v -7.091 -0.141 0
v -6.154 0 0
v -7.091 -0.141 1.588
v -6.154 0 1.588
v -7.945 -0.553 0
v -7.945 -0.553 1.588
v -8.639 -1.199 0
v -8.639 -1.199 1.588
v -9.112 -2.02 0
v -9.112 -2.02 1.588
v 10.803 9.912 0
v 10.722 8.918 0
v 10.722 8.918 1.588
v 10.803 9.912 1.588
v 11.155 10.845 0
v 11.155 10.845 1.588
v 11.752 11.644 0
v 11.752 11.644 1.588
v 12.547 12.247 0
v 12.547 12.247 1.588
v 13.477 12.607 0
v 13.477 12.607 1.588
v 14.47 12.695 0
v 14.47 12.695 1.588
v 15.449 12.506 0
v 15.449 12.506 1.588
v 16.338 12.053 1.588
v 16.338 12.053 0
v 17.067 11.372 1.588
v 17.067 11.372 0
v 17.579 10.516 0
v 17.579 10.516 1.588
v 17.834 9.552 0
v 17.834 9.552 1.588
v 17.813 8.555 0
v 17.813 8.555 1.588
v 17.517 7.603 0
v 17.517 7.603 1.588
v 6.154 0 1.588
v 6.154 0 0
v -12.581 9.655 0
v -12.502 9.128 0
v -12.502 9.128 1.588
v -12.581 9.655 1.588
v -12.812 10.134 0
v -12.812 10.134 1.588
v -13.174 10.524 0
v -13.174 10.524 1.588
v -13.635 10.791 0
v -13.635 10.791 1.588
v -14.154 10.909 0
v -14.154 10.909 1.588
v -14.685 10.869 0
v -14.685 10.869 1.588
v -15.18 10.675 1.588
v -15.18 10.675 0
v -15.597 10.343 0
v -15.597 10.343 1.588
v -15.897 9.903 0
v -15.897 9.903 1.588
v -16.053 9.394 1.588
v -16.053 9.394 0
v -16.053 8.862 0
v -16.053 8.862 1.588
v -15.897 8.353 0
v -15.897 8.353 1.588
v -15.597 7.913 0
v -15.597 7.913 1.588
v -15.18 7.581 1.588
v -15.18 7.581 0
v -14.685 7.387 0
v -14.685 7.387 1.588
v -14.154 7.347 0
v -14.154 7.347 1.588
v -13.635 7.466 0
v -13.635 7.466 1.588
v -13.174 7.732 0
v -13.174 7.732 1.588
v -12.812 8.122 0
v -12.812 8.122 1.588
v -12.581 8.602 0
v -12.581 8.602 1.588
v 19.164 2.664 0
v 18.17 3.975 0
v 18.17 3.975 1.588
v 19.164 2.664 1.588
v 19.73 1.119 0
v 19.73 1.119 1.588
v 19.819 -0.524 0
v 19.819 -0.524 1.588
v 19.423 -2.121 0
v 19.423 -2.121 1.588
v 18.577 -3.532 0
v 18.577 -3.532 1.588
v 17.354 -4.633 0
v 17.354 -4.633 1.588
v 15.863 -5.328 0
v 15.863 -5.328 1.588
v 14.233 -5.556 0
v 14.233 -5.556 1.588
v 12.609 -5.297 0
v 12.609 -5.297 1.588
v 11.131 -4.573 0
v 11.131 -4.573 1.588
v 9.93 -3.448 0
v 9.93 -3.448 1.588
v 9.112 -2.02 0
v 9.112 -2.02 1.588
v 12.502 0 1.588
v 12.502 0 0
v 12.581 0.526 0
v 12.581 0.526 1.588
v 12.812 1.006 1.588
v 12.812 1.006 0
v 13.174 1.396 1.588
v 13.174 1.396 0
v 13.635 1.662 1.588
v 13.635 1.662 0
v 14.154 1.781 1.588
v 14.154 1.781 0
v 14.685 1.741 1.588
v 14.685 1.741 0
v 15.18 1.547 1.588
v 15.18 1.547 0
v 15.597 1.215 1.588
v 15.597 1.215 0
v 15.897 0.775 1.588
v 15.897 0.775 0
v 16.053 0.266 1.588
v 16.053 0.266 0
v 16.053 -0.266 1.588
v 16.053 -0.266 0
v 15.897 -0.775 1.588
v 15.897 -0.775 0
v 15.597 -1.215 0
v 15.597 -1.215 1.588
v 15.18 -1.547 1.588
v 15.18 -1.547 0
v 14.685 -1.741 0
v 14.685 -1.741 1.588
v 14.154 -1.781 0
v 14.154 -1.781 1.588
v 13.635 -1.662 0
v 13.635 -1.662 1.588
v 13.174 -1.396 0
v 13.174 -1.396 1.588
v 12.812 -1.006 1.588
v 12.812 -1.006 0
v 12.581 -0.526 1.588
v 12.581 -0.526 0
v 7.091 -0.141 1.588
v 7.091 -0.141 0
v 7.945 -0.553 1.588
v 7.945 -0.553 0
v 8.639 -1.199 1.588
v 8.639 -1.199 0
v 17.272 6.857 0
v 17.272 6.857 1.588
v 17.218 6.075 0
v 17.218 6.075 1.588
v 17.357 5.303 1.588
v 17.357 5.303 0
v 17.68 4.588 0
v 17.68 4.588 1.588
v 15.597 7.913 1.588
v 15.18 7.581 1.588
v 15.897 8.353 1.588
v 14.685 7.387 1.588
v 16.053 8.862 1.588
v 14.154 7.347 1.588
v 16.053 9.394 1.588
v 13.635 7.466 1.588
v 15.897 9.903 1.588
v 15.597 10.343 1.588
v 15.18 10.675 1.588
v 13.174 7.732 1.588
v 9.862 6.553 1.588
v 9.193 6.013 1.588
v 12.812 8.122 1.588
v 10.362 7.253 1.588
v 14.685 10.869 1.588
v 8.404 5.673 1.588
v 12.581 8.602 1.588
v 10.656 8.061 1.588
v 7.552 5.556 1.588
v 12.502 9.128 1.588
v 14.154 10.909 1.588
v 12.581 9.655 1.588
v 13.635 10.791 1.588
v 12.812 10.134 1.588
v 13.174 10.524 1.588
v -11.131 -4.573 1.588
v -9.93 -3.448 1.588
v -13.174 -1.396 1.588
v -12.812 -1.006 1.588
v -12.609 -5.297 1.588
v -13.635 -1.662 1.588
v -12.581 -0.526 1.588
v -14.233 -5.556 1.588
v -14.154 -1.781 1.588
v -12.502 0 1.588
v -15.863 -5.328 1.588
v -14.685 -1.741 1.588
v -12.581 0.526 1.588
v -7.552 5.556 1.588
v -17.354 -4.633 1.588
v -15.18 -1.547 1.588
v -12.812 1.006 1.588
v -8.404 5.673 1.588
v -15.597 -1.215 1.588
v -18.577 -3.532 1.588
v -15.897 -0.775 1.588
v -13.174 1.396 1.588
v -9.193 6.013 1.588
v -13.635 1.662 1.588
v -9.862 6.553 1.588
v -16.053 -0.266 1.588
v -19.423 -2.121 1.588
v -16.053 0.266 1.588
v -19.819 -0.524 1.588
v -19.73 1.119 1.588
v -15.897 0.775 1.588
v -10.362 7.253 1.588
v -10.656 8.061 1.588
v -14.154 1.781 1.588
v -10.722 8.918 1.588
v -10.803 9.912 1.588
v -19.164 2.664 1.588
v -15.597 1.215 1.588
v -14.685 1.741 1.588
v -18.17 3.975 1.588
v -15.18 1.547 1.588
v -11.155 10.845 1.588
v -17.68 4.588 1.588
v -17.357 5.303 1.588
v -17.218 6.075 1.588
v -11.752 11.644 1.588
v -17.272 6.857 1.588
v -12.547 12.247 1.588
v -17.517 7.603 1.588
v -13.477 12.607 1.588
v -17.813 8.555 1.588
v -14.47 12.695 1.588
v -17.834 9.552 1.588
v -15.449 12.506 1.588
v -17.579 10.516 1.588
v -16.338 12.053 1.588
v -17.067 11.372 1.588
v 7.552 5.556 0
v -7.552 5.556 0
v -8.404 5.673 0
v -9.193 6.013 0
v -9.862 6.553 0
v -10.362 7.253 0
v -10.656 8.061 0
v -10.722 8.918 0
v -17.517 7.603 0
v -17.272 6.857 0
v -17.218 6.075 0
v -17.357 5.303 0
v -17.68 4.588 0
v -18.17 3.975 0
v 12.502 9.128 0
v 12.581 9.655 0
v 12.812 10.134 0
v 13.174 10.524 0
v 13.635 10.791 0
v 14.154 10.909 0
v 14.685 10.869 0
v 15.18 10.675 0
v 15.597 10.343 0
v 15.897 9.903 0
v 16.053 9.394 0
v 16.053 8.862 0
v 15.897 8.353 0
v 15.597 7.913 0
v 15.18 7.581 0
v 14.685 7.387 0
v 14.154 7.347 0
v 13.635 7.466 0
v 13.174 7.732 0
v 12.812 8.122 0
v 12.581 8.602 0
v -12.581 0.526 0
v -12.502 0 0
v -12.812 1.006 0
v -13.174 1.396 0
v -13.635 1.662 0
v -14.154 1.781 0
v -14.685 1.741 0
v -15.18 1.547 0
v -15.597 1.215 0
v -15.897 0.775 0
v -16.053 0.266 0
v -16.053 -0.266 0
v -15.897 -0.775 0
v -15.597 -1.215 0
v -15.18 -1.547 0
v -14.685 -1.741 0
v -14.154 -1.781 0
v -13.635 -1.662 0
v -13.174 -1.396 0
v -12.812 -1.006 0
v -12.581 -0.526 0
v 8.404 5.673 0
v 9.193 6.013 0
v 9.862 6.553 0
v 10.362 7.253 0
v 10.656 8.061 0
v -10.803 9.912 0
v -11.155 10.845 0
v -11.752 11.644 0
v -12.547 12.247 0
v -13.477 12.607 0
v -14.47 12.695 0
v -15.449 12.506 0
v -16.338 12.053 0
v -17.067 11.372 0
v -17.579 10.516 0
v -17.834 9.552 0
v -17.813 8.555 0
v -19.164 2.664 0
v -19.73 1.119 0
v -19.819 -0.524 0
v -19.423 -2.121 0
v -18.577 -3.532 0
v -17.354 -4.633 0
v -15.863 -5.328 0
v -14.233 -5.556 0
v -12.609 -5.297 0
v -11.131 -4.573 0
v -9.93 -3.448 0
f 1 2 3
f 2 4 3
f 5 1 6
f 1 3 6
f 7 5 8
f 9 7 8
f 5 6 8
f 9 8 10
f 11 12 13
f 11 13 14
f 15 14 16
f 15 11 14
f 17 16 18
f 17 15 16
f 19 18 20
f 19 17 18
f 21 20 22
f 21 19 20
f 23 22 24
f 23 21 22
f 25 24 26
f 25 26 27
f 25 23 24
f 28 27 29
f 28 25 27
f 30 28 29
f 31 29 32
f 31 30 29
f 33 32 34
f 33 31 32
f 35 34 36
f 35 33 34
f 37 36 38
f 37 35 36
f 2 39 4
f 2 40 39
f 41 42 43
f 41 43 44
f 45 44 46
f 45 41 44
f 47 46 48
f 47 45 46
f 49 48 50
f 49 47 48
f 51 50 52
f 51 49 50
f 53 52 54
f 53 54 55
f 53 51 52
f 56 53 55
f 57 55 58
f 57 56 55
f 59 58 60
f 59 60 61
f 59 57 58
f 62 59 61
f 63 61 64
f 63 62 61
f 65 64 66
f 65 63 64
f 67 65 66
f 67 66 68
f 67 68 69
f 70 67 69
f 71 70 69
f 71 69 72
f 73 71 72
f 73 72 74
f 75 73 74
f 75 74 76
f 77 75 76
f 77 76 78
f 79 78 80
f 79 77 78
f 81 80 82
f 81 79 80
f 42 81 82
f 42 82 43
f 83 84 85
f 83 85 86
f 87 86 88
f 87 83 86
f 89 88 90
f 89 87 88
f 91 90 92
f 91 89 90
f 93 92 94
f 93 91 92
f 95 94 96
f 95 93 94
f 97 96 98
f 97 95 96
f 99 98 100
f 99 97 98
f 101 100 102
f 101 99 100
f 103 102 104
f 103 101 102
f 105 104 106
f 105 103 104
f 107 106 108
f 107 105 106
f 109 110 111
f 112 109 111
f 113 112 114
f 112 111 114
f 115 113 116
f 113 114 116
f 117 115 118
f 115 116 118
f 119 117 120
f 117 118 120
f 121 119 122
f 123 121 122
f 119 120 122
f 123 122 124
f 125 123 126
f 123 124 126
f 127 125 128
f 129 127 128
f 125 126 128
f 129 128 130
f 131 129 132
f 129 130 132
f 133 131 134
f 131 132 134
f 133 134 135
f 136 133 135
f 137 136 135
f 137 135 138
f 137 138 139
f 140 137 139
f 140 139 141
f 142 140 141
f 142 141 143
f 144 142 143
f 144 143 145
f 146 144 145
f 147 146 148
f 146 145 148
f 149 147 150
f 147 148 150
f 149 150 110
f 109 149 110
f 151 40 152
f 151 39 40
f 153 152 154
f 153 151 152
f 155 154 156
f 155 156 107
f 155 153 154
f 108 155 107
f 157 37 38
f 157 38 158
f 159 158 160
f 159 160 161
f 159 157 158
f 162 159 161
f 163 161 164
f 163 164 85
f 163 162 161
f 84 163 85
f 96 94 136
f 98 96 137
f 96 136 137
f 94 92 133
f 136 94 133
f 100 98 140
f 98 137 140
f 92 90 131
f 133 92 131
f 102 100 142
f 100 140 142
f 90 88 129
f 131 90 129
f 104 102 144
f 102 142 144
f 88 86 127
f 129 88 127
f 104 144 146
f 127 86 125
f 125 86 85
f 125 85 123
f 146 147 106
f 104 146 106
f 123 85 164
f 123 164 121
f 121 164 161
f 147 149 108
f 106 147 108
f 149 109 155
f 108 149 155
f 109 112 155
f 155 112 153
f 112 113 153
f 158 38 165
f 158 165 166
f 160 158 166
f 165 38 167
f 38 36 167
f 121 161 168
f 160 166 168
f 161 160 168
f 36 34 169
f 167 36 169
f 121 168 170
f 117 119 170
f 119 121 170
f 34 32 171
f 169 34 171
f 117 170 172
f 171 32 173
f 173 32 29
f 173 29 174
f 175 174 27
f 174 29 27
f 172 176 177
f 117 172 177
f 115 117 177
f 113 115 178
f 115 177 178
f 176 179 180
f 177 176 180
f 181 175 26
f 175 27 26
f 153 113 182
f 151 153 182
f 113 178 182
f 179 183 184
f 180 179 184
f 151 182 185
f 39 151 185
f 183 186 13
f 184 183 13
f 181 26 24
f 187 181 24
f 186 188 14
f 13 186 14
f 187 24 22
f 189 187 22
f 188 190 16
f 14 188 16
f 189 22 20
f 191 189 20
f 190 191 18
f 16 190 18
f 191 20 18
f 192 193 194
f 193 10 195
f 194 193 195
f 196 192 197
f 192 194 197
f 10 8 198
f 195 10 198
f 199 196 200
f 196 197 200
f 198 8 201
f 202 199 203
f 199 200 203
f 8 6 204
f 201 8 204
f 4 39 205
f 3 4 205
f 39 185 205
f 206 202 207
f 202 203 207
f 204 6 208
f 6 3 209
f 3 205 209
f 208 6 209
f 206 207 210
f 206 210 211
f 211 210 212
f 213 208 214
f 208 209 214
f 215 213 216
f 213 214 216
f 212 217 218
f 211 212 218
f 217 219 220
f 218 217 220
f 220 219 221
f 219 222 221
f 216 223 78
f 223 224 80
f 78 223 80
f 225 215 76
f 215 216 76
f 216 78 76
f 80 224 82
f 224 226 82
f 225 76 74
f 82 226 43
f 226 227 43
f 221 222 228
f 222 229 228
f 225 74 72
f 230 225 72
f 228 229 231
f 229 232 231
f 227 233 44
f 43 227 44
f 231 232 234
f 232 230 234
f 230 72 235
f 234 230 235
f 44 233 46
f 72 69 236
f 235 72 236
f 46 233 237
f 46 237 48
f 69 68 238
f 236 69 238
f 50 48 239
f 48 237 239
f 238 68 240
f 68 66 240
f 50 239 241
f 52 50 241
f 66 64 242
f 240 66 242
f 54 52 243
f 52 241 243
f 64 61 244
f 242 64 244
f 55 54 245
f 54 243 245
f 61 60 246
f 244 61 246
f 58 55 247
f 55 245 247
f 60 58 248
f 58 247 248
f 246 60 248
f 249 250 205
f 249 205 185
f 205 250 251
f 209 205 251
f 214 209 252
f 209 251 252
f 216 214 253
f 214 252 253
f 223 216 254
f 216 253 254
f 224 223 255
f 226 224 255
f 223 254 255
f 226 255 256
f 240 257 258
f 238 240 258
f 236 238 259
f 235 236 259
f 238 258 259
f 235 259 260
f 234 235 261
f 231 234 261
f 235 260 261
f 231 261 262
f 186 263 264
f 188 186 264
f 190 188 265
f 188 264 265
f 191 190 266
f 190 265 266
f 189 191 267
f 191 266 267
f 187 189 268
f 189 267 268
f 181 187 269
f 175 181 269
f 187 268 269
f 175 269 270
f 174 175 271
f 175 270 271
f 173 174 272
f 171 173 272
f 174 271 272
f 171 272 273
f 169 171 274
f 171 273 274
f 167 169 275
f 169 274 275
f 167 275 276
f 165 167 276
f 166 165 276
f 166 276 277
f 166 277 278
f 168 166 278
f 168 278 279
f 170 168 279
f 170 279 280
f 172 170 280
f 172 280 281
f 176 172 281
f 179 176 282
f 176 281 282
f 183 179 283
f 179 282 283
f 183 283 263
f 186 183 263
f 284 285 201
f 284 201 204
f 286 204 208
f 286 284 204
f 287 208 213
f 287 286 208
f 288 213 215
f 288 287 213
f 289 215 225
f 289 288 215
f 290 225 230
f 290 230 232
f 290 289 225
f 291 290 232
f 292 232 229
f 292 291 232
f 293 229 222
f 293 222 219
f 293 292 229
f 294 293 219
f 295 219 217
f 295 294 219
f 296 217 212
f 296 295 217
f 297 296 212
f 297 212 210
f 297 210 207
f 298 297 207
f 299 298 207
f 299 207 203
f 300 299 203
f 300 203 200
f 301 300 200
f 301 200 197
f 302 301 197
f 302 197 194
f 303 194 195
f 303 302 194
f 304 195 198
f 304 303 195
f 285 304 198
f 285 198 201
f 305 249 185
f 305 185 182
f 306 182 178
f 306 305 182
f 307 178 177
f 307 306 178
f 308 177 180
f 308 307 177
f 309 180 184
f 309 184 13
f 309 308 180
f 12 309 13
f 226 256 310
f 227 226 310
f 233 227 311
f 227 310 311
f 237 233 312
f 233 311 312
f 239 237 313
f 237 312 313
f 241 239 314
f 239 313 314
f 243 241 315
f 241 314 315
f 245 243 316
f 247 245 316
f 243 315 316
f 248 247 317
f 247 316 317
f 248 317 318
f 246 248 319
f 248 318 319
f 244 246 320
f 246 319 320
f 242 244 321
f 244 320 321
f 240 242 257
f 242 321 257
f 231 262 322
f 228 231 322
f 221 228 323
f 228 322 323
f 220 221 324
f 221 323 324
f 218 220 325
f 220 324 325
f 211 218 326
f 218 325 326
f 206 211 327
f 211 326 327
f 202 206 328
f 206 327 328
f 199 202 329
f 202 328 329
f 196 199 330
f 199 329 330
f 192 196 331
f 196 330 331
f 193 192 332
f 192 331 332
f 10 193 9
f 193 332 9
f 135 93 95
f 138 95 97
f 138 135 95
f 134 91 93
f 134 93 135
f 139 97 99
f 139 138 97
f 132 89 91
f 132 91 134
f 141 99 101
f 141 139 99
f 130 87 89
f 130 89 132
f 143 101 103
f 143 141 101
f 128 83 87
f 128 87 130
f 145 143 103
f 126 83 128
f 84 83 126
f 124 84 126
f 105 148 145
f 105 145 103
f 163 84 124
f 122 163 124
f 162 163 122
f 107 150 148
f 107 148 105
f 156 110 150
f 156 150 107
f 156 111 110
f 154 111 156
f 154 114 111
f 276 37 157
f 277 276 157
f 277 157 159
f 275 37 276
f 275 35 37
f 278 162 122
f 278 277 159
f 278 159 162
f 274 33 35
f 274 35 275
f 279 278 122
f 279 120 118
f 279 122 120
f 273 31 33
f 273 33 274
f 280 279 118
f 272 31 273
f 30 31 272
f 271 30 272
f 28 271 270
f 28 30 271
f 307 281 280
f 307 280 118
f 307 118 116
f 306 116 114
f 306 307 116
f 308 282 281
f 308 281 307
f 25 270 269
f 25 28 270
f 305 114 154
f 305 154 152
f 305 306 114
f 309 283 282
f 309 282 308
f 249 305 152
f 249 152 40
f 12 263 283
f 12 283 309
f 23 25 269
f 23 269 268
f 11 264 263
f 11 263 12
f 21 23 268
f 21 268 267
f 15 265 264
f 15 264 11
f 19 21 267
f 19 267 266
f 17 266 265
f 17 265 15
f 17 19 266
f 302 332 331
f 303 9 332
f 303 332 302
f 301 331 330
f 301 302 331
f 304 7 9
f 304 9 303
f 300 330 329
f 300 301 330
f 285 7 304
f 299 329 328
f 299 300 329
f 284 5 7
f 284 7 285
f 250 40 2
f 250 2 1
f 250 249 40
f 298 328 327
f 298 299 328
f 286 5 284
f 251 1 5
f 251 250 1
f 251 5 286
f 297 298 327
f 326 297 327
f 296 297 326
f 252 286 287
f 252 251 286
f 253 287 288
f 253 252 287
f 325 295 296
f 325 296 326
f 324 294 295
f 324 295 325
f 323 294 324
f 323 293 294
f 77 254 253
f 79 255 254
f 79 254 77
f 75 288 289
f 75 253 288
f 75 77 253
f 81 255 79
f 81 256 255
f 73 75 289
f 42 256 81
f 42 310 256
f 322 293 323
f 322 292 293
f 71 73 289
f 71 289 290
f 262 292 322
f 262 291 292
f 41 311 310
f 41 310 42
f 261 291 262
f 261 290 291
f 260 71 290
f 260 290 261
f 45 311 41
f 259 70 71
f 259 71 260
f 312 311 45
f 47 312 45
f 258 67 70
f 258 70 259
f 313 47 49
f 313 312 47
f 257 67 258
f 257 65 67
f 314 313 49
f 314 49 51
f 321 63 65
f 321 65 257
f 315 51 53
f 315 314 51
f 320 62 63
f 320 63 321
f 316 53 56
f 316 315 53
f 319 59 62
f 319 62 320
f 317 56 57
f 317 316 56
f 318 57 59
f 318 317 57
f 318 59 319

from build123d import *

# Parameters (mm, degrees)
SKETCH1_R            = 1.7859375
BOSS_EXTRUDE1_DEPTH  = 1.5875
FILLET1_R            = 3.175
FILLET1_OF_MIRROR1_R = 3.175


with BuildPart() as part:
    # Sketch1 → Boss-Extrude1 (new body)
    with BuildSketch(Plane.XY):
        with BuildLine():
            Line((-8.73125, 0), (0, 0))
            Line((0, 0), (0, 5.55625))
            Line((0, 5.55625), (-7.552307909, 5.55625))
            ThreePointArc((-7.552307909, 5.55625), (-9.862459716, 6.553217945), (-10.721810073, 8.918014642))
            ThreePointArc((-10.721810073, 8.918014642), (-14.966353253, 12.634896917), (-17.517188185, 7.602541425))
            ThreePointArc((-17.517188185, 7.602541425), (-17.263166539, 5.68441597), (-18.169650628, 3.9750246))
            ThreePointArc((-18.169650628, 3.9750246), (-16.444084642, -5.120650031), (-8.73125, 0))
        make_face()
        with Locations((-14.2875, 0)):
            Circle(SKETCH1_R, mode=Mode.SUBTRACT)
        with Locations((-14.2875, 9.128125)):
            Circle(SKETCH1_R, mode=Mode.SUBTRACT)
    boss_extrude1 = extrude(amount=BOSS_EXTRUDE1_DEPTH)

    # Fillet1
    fillet1_edges = [part.edges().sort_by_distance(p)[0] for p in [
        (-8.73125, 0, 0.79375),
    ]]
    fillet(fillet1_edges, radius=FILLET1_R)

    # Mirror1: Boss-Extrude1 across plane
    add(boss_extrude1.mirror(Plane(origin=(0, 0, 1.5875), x_dir=(0, 0, 1), z_dir=(1, 0, 0))))

    # Fillet1 of Mirror1
    fillet1_of_mirror1_edges = [part.edges().sort_by_distance(p)[0] for p in [
        (8.73125, 0, 0.79375),
    ]]
    fillet(fillet1_of_mirror1_edges, radius=FILLET1_OF_MIRROR1_R)


solid = part.part
